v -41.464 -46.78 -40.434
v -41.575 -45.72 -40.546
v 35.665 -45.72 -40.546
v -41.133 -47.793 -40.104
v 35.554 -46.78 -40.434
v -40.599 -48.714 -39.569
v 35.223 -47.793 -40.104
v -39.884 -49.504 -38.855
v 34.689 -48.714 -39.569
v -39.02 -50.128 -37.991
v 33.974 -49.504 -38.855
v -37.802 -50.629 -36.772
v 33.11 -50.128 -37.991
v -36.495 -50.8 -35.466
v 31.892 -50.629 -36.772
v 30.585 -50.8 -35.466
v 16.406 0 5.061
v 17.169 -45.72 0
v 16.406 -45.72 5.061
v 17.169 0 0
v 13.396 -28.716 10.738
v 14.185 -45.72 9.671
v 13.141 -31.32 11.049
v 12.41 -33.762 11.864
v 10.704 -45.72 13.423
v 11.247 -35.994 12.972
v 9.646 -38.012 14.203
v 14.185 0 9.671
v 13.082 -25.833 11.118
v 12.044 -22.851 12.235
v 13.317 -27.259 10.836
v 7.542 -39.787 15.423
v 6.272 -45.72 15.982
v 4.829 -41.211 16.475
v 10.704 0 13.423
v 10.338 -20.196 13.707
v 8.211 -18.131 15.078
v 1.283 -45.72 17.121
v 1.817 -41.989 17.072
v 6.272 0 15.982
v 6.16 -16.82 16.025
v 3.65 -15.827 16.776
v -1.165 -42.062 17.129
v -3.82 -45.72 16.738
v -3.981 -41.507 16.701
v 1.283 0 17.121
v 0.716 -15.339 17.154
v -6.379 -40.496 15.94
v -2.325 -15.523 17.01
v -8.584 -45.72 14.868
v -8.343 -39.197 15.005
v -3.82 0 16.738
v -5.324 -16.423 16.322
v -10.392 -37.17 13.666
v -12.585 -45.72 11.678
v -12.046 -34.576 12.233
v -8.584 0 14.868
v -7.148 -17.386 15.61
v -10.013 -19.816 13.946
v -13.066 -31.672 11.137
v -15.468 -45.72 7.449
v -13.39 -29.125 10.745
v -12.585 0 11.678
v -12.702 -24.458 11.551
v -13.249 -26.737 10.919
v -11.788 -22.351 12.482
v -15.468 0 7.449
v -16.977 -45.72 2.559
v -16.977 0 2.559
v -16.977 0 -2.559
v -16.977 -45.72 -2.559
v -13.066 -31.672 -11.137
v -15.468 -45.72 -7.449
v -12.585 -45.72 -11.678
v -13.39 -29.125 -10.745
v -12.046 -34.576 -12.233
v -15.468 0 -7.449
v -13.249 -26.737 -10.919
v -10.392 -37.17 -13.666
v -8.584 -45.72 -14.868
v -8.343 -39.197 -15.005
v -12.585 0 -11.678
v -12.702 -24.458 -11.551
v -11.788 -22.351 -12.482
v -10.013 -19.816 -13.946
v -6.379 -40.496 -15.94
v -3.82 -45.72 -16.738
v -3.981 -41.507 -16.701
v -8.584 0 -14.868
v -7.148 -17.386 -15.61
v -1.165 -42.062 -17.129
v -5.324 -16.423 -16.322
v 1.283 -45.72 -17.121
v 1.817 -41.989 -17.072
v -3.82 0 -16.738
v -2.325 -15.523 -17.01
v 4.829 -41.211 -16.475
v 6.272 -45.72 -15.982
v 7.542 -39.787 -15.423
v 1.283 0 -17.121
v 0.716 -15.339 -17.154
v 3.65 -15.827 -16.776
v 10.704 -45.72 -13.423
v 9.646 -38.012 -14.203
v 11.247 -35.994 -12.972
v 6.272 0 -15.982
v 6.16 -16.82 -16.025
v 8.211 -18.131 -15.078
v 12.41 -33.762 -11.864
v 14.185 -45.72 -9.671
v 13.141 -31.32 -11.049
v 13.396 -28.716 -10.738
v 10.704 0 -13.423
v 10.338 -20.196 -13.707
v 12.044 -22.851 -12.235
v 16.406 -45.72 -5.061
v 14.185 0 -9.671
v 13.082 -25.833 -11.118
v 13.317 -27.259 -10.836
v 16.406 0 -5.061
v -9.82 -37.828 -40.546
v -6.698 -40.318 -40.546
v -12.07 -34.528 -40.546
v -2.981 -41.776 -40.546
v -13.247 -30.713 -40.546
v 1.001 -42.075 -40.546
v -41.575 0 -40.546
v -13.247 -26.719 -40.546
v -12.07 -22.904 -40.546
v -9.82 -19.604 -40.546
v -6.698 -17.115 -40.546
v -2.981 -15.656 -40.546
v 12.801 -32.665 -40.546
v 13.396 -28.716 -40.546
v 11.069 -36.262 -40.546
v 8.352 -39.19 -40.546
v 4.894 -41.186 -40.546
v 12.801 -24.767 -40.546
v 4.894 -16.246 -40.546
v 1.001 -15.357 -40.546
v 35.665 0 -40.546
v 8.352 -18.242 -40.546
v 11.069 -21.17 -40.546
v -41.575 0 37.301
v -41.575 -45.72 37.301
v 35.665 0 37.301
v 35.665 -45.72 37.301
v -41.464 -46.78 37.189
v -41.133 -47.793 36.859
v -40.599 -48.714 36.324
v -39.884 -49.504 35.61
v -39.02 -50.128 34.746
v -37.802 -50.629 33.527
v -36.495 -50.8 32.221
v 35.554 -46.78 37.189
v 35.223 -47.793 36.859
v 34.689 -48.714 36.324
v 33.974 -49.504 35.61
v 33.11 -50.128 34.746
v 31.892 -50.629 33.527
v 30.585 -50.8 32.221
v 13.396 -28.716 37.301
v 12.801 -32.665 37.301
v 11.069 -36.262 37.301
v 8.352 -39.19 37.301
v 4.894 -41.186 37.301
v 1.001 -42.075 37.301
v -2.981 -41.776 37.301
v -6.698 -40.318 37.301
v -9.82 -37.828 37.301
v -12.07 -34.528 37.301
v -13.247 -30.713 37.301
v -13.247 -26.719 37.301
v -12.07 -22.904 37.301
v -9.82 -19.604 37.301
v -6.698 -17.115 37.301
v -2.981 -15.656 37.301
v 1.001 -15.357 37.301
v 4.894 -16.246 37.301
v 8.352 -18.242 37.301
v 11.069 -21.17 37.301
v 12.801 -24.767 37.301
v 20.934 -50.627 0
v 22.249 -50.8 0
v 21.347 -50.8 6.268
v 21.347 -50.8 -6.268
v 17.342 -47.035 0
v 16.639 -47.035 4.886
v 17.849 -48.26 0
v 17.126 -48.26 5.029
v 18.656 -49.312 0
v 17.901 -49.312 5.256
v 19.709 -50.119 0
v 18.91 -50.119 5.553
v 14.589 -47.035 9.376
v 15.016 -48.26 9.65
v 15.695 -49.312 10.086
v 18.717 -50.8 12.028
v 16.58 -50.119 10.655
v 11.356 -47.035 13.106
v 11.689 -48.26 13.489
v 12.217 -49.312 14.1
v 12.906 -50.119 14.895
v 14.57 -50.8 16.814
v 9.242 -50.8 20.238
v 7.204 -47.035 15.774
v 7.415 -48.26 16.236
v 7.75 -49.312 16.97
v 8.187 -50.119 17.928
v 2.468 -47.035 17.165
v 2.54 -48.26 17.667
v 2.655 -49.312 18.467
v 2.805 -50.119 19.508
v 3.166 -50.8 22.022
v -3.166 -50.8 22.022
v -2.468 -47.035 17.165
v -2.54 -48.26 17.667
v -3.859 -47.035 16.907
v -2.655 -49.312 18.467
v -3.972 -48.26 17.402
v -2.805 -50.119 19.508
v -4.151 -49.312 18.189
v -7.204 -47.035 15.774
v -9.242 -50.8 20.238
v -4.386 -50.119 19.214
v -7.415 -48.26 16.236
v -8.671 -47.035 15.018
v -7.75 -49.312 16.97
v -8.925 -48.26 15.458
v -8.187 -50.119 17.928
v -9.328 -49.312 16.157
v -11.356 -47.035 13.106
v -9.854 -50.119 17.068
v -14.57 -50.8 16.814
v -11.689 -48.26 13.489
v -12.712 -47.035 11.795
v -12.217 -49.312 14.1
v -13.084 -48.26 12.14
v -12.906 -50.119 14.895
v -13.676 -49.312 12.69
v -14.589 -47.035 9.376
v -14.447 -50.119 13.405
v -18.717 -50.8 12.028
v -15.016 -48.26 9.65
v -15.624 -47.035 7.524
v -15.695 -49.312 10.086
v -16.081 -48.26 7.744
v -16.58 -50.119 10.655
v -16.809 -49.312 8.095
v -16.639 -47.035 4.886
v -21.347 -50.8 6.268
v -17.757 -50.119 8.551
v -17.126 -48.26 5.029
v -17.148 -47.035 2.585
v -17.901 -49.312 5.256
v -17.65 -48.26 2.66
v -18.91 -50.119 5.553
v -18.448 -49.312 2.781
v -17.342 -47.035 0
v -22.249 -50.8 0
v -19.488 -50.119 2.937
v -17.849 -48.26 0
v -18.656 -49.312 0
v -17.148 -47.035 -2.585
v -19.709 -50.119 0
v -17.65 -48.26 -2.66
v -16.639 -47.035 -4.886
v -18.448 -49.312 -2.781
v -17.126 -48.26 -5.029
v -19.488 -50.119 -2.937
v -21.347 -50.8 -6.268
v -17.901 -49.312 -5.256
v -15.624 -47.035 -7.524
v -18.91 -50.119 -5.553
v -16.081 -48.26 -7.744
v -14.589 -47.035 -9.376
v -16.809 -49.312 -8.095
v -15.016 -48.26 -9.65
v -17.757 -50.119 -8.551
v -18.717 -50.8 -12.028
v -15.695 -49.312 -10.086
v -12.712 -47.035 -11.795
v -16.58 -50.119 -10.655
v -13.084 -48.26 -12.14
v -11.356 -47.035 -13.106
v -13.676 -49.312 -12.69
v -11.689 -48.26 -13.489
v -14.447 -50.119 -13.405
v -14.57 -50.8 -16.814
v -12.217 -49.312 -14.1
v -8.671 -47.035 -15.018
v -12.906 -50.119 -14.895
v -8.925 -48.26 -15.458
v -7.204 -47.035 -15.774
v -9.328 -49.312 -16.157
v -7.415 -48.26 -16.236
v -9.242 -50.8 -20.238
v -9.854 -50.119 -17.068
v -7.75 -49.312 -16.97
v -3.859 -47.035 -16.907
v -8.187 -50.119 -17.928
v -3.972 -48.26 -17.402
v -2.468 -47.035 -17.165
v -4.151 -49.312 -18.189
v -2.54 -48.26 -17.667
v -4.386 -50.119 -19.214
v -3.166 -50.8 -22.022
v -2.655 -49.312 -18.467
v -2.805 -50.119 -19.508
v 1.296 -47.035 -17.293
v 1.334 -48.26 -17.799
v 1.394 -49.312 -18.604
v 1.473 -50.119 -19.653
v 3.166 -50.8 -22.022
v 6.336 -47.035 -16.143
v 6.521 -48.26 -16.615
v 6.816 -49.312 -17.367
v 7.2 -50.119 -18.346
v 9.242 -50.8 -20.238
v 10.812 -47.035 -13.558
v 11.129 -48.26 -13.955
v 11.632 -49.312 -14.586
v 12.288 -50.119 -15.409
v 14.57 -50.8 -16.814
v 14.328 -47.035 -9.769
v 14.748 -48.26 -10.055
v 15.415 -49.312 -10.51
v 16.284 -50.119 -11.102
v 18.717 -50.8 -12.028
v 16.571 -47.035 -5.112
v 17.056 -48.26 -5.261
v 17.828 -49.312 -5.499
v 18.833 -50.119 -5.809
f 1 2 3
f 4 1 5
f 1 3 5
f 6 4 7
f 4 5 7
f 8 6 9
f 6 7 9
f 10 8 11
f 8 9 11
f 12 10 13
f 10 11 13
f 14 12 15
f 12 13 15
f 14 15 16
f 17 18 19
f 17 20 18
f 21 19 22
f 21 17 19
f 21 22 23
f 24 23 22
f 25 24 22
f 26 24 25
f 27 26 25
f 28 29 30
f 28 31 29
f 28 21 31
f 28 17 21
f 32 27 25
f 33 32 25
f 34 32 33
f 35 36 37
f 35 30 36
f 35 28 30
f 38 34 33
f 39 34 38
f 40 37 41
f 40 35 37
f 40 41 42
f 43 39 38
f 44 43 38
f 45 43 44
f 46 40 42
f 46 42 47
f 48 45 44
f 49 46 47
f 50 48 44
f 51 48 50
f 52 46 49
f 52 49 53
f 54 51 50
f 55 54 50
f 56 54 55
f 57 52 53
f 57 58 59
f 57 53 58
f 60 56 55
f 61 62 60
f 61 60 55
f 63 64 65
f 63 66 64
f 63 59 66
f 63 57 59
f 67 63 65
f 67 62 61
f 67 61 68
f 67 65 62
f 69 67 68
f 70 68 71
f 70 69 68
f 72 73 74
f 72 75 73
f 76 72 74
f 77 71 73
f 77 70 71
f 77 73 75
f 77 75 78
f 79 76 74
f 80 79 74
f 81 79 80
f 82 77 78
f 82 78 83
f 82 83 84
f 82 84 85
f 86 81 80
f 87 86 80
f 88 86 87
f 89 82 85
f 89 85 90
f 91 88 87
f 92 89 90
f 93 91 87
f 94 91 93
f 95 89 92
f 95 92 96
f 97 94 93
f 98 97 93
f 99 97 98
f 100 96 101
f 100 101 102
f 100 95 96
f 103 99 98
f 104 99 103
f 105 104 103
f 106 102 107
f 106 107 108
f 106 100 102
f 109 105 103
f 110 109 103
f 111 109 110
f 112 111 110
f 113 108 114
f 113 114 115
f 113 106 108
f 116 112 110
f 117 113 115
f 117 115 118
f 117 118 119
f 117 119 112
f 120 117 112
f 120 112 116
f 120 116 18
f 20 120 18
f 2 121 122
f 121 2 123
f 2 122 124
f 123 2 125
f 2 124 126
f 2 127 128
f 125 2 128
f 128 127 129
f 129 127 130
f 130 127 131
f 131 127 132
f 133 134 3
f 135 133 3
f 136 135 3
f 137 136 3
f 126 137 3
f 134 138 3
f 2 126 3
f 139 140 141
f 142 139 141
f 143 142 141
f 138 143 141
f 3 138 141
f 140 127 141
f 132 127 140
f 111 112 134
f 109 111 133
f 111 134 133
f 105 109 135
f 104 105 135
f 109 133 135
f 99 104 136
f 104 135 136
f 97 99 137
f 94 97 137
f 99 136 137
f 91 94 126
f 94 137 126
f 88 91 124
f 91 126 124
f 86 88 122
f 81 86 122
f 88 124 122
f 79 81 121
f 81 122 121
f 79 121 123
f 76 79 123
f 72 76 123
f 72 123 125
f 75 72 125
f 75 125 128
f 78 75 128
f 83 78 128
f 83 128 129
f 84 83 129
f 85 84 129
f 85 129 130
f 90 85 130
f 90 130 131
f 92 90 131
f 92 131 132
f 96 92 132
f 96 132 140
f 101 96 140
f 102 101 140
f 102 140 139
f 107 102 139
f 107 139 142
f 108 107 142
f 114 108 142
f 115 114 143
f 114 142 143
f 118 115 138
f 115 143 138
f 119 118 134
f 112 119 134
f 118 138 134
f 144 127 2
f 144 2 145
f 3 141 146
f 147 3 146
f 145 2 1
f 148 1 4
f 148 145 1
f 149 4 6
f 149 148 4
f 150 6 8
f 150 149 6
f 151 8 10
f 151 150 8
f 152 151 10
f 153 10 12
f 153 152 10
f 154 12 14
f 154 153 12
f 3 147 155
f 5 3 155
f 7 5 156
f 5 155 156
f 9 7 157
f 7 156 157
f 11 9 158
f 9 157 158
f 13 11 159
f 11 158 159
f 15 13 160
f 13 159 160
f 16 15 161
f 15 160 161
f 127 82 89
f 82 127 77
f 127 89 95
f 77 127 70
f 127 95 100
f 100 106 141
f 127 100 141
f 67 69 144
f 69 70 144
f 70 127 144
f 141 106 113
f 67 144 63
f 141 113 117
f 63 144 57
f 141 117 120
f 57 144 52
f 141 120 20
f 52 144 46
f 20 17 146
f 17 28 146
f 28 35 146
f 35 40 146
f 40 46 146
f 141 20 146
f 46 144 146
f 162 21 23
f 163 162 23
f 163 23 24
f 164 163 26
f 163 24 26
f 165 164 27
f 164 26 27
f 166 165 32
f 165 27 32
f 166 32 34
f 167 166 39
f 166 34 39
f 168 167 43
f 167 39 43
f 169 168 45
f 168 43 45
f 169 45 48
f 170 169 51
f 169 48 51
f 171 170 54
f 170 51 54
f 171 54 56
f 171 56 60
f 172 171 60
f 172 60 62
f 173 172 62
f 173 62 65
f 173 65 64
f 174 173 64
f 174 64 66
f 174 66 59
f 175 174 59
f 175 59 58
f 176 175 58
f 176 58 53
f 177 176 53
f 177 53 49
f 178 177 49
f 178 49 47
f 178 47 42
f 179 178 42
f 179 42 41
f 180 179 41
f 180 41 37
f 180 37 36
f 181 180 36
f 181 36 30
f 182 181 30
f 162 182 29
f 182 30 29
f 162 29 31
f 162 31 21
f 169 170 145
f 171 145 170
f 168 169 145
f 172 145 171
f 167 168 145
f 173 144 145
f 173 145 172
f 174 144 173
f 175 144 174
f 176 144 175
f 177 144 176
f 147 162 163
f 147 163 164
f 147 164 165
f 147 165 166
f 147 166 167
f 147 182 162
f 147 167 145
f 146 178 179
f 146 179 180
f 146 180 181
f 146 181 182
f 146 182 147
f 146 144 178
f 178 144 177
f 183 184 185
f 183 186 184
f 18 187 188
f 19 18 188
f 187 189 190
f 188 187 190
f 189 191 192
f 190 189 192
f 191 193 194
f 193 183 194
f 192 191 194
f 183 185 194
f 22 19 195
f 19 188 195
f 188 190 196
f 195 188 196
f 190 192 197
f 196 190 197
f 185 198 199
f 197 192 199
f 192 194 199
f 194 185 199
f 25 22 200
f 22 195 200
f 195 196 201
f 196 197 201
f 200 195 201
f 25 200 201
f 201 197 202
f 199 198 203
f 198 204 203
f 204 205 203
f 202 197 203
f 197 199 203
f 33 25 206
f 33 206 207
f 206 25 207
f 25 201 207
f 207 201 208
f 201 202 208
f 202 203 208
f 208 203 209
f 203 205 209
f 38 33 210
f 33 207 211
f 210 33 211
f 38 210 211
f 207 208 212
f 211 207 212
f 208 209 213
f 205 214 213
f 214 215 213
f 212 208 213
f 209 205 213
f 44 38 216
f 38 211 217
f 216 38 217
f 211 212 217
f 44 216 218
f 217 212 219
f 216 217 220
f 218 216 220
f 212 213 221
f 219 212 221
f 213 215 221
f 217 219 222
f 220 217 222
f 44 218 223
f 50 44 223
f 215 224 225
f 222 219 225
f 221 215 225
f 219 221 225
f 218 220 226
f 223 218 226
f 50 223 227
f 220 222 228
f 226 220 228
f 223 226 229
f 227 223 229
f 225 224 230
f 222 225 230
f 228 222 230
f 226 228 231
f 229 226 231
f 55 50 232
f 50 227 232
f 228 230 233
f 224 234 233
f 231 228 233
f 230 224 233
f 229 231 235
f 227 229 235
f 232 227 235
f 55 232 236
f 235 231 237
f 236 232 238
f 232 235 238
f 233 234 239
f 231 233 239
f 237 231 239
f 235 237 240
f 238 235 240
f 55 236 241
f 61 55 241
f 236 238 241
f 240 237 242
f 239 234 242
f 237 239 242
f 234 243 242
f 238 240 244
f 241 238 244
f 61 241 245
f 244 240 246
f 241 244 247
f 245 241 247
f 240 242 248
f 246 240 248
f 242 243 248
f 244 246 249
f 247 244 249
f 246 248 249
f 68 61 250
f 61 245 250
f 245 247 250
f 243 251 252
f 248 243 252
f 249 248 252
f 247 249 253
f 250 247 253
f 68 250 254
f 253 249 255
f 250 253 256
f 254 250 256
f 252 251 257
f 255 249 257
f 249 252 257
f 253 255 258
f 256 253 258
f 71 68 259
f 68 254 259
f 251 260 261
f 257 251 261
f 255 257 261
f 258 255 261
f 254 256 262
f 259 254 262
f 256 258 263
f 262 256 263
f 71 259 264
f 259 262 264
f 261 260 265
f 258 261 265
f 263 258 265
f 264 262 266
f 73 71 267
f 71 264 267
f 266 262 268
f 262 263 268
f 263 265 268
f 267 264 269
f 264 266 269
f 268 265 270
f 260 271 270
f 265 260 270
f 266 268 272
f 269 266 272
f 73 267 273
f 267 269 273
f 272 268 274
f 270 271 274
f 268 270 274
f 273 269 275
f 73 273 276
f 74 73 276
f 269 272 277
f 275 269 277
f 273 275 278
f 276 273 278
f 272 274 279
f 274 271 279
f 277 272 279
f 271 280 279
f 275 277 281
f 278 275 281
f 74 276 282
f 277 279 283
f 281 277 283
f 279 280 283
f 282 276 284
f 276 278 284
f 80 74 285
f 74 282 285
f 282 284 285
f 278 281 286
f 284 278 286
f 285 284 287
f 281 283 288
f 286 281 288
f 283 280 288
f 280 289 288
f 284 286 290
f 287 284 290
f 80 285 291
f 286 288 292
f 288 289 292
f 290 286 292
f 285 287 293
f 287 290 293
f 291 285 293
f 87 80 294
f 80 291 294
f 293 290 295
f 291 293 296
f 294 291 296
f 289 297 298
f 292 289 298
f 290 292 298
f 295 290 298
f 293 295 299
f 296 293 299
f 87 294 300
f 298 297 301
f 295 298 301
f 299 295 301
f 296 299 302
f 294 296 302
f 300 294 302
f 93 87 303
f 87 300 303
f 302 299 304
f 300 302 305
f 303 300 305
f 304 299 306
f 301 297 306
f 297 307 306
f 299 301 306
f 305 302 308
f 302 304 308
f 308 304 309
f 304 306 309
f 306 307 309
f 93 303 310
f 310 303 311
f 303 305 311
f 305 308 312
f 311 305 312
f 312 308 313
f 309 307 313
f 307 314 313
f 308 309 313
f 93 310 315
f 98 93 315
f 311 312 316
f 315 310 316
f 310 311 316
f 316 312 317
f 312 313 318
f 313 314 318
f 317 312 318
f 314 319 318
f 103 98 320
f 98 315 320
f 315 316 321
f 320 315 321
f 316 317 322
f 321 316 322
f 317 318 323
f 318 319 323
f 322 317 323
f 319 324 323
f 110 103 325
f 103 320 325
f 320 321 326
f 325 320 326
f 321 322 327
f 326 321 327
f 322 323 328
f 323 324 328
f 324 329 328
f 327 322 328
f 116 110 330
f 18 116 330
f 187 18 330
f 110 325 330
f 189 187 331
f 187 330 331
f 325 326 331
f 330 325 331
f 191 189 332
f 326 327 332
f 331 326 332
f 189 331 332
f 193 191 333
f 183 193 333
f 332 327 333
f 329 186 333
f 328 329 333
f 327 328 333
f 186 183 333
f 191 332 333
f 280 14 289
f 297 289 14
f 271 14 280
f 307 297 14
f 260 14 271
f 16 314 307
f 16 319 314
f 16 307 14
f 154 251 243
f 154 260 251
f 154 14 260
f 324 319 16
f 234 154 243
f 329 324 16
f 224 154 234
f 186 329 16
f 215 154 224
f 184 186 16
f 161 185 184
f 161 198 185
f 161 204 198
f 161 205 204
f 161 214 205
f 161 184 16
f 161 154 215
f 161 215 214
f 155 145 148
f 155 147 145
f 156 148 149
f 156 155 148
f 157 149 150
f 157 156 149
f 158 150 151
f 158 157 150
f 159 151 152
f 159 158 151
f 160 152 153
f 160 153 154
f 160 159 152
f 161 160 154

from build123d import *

# Parameters (mm, degrees)
F0_W     = 77.2405713797
F0_H     = 77.8463184834
F0_R     = 17.1685214952
F1_DEPTH = 50.8
F2_R     = 5.08
F3_R     = 13.396248622
F4_DEPTH = 228.6


with BuildPart() as f1:
    # F0 (on Front) → F1 (new body)
    with BuildSketch(Plane.XZ):
        with Locations((-2.95496732, -1.6224384308)):
            Rectangle(F0_W, F0_H)
        Circle(F0_R, mode=Mode.SUBTRACT)
    extrude(amount=F1_DEPTH)

    # F2
    f2_edges = [f1.edges().sort_by_distance(p)[0] for p in [
        (-2.954967, -50.8, -40.545598),
        (35.665318, -50.8, -1.622438),
        (-2.954967, -50.8, 37.300721),
        (-41.575253, -50.8, -1.622438),
        (-17.168521, -50.8, 0),
    ]]
    fillet(f2_edges, radius=F2_R)

    # F3 (on face) → F4 (cut)
    with BuildSketch(Plane(origin=(0, 0, -40.5455976725), x_dir=(1, 0, 0), z_dir=(0, 0, -1))):
        with Locations((0, 28.7160556763)):
            Circle(F3_R)
    extrude(amount=-F4_DEPTH, mode=Mode.SUBTRACT)


solid = f1.part
